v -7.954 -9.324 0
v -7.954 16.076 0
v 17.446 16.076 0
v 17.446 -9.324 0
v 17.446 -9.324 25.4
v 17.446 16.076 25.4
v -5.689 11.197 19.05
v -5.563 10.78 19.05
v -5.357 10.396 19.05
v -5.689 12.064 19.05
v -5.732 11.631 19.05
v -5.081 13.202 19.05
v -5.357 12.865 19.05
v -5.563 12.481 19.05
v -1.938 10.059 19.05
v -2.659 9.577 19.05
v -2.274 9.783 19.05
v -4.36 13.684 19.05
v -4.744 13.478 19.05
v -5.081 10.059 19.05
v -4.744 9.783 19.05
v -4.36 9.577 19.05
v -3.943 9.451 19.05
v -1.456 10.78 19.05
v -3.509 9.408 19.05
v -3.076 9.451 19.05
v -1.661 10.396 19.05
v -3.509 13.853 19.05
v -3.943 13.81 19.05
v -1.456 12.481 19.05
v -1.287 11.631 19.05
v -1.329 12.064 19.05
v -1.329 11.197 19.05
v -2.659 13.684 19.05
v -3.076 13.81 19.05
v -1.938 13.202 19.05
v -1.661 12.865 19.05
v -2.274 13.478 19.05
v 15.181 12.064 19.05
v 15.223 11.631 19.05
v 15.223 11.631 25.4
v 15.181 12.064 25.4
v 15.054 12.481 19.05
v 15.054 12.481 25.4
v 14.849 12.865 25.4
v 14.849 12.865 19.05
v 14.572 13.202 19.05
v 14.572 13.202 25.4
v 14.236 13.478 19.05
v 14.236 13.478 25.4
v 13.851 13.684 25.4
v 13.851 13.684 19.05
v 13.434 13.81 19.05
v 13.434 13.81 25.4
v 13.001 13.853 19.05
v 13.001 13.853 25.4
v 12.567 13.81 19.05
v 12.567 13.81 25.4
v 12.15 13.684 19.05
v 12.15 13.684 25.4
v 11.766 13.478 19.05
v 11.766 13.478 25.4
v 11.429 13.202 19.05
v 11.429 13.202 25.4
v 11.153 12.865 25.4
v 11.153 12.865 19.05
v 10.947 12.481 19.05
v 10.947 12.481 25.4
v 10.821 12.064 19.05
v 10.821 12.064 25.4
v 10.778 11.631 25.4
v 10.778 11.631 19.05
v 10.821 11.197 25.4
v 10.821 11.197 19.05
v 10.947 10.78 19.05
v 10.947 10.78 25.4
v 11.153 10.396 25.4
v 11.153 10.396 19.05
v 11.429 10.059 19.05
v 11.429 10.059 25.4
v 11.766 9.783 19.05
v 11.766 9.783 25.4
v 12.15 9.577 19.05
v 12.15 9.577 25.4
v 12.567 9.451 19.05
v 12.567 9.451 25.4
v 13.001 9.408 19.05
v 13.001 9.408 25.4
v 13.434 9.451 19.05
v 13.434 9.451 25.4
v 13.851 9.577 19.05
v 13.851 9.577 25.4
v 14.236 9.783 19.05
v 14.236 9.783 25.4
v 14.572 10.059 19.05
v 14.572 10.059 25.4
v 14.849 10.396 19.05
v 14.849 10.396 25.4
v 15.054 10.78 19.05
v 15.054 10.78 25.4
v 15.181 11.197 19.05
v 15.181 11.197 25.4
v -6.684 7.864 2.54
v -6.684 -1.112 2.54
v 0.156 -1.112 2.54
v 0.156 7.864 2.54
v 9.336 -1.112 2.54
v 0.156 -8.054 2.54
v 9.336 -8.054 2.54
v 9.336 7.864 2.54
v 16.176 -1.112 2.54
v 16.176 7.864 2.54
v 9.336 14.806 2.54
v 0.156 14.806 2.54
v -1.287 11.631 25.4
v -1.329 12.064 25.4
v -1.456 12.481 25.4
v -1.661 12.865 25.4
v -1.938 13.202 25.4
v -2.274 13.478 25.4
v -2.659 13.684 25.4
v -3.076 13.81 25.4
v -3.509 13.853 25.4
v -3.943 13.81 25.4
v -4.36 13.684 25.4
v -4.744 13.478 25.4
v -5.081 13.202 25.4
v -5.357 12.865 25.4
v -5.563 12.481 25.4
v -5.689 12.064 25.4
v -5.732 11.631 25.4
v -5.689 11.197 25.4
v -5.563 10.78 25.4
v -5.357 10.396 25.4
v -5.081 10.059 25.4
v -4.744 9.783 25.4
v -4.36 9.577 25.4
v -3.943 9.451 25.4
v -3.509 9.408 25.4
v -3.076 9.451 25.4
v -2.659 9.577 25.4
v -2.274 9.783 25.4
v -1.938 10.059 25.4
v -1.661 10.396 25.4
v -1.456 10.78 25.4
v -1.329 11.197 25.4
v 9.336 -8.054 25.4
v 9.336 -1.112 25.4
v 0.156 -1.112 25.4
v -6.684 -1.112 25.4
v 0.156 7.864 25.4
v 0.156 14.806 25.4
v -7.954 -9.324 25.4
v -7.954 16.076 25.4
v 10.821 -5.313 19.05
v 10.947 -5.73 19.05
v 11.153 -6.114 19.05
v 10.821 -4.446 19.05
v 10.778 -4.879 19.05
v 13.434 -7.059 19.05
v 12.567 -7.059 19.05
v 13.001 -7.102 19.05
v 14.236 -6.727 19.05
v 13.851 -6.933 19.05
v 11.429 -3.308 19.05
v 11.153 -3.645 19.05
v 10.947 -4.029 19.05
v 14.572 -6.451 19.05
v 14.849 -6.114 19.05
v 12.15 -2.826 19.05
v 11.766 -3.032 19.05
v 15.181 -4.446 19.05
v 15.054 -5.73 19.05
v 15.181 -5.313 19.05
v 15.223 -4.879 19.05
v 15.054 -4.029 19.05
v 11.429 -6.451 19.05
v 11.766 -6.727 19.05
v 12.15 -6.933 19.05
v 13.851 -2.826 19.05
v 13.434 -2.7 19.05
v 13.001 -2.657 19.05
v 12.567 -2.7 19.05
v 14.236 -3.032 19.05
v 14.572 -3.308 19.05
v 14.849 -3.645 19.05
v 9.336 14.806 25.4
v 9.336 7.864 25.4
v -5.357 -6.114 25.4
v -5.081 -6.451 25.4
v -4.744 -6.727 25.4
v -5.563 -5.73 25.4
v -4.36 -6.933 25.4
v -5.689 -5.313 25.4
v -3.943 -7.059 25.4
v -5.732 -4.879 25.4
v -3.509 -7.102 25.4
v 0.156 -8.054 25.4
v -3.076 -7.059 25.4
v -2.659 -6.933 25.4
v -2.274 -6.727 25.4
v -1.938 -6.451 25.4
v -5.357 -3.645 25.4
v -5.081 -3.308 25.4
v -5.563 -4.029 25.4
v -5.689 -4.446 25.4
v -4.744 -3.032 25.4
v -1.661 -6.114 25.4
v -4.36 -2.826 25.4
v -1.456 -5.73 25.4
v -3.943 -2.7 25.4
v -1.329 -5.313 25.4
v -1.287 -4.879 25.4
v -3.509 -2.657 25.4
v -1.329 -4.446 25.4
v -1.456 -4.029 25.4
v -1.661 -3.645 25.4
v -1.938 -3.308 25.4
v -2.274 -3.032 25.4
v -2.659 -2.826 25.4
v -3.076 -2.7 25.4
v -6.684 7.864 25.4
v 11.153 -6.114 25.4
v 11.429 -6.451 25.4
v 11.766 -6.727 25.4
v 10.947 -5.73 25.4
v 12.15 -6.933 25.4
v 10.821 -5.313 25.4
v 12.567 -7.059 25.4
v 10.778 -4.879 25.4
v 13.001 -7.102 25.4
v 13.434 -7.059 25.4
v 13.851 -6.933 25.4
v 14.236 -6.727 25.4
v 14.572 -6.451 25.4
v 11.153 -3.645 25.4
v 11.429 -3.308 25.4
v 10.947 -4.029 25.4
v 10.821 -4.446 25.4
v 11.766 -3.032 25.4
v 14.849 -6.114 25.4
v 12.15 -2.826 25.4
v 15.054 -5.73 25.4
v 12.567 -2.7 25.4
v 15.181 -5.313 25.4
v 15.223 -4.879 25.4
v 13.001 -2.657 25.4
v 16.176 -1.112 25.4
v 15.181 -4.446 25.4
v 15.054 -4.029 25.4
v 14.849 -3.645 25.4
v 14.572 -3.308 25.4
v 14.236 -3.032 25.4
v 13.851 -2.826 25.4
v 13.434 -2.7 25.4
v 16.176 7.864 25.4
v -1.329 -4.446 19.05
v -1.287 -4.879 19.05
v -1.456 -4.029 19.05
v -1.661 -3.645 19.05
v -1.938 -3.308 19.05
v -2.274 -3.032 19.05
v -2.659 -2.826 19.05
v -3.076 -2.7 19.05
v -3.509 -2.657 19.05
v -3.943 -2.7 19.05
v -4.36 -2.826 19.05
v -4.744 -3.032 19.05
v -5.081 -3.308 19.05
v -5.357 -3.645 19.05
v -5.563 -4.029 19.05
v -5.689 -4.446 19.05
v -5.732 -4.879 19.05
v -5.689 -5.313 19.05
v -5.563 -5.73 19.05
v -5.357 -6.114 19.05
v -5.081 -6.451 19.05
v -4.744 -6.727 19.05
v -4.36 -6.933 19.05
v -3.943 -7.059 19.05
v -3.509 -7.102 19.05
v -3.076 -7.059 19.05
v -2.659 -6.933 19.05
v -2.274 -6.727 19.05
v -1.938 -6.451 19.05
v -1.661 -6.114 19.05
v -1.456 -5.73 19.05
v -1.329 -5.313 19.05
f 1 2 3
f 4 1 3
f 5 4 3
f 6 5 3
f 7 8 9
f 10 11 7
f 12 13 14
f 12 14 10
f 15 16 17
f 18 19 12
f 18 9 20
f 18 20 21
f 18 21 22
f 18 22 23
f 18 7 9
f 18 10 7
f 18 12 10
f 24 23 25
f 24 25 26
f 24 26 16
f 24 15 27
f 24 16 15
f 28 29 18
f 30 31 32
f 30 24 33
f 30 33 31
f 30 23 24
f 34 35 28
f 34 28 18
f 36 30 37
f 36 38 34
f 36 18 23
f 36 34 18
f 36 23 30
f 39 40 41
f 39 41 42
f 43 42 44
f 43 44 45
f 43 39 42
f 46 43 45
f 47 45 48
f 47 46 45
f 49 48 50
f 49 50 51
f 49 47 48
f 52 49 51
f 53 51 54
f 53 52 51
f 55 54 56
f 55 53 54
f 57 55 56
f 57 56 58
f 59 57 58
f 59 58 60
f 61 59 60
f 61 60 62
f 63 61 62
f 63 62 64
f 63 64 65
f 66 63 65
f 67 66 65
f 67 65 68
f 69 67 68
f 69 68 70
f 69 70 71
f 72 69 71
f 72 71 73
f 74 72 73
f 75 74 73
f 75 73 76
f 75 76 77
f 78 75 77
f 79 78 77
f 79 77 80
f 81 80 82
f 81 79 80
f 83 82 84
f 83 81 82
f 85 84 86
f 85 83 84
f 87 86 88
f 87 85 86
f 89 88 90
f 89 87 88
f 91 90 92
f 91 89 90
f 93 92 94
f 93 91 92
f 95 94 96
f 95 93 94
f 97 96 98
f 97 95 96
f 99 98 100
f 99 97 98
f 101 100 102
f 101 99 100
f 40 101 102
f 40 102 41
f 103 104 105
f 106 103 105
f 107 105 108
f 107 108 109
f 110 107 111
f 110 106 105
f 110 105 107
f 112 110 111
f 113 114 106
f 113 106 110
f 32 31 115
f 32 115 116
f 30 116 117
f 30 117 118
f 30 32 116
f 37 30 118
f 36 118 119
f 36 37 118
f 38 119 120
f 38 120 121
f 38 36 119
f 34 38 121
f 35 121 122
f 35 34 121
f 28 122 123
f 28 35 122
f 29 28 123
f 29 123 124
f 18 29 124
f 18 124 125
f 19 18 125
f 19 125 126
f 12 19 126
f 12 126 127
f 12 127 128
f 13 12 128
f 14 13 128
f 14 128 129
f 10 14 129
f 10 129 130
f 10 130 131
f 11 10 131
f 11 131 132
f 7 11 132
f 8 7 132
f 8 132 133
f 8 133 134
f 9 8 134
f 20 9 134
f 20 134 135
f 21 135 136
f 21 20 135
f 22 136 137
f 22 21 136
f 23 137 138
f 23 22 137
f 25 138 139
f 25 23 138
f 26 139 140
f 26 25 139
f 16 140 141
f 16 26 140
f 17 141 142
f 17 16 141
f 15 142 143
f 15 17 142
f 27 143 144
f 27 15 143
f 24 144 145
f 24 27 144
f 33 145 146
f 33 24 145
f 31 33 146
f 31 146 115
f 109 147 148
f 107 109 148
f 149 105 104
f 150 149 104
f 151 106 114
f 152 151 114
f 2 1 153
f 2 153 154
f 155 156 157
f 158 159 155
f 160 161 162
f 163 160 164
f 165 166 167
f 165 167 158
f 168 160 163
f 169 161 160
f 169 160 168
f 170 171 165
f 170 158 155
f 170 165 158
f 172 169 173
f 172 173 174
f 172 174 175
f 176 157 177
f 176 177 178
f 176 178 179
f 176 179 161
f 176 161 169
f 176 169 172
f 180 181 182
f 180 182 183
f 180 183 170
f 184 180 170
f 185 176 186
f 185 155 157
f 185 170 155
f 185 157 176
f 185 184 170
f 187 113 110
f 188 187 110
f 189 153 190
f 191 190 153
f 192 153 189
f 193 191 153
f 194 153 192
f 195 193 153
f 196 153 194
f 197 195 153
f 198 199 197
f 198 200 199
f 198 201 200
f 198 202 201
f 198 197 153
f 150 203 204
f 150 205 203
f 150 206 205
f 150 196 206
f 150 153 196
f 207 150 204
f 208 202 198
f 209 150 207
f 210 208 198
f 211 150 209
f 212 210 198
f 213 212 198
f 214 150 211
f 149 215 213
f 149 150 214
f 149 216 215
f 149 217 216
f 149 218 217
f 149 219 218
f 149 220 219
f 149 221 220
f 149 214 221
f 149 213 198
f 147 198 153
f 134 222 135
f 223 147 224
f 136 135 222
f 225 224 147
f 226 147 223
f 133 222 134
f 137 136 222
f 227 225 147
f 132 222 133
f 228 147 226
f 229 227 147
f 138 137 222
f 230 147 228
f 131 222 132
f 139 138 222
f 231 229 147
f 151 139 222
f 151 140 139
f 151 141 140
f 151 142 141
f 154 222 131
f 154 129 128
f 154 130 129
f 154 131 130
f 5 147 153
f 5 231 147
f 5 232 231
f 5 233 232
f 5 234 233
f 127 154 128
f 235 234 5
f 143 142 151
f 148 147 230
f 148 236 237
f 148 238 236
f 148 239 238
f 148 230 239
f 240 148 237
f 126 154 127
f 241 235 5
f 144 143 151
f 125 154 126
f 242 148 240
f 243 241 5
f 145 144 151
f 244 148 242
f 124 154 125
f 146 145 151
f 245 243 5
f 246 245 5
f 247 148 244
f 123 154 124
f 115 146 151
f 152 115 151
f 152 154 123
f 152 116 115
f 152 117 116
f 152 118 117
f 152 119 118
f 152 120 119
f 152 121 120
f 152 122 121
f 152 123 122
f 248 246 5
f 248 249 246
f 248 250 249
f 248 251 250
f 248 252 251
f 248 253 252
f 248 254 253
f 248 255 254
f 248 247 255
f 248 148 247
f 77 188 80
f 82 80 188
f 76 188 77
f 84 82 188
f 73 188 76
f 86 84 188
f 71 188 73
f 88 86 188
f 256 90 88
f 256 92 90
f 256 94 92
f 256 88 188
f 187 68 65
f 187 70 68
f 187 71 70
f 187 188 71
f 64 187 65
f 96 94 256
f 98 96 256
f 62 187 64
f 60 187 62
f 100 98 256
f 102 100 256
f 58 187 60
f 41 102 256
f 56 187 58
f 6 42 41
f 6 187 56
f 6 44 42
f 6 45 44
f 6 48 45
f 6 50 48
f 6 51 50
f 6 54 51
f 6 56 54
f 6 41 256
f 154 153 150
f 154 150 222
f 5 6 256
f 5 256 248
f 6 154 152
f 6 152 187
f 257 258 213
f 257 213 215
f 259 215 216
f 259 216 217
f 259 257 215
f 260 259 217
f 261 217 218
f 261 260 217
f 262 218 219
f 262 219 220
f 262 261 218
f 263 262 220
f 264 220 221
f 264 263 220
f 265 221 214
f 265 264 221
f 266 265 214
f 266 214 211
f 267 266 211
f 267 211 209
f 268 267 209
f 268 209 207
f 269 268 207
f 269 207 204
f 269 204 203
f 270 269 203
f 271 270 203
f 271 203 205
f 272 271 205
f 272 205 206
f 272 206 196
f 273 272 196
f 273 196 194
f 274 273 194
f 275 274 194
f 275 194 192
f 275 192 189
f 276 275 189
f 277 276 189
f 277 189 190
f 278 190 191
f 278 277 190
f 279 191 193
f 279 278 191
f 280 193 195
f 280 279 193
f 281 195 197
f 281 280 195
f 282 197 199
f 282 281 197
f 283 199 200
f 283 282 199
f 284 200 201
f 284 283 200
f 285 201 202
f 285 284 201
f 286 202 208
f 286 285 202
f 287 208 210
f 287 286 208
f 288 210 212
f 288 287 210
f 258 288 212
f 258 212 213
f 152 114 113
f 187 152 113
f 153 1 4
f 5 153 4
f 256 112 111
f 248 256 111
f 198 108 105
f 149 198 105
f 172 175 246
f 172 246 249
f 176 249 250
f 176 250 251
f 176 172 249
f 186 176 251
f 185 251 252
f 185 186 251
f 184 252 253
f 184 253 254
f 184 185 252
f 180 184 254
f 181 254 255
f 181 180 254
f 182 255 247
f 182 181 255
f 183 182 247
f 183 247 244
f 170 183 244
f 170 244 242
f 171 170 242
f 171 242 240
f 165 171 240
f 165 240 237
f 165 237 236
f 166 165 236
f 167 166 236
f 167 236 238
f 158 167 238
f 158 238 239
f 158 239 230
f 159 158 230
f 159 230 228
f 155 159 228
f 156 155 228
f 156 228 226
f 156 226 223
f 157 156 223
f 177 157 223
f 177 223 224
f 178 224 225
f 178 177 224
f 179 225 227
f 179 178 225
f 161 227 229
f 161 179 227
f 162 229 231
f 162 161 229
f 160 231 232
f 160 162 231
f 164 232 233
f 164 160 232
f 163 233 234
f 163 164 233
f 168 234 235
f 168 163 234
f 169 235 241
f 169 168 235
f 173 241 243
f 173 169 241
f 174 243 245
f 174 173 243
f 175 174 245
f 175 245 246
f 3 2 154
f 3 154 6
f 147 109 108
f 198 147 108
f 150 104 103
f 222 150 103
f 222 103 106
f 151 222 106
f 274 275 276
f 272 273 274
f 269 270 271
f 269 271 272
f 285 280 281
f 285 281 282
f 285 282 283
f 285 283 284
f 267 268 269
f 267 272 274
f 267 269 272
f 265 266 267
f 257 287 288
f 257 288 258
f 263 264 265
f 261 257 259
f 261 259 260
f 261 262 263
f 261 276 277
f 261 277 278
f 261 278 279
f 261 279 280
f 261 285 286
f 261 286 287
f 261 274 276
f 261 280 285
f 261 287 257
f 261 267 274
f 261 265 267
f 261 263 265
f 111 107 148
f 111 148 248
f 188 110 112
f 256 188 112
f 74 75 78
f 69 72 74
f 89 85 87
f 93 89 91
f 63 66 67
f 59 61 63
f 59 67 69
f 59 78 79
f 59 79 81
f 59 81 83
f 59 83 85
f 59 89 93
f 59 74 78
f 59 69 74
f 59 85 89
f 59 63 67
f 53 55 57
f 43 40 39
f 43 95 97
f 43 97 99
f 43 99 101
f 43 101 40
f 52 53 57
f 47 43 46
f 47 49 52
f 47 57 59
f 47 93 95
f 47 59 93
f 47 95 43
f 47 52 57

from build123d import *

# Parameters (mm, degrees)
F1_DEPTH = 2.54
F0_R     = 2.2225
F2_DEPTH = 19.05
F0_W     = 25.4
F0_H     = 25.4
F0_W_2   = 6.8400954445
F0_H_2   = 6.9419826217
F3_DEPTH = 25.4


with BuildPart() as f1:
    # F0 (on Top) → F1 (new body)
    with BuildSketch(Plane.XY):
        Polygon((16.1757896501, -1.1124916385), (16.1757896501, 7.8635431181), (9.3356942055, 7.8635431181), (9.3356942055, 14.8055257398), (0.1558850946, 14.8055257398), (0.1558850946, 7.8635431181), (-6.6842103499, 7.8635431181), (-6.6842103499, -1.1124916385), (0.1558850946, -1.1124916385), (0.1558850946, -8.0544742602), (9.3356942055, -8.0544742602), (9.3356942055, -1.1124916385), align=None)
    extrude(amount=F1_DEPTH)



with BuildPart() as f2:
    # F0 (on Top) → F2 (new body)
    with BuildSketch(Plane.XY):
        with Locations((-3.5092103499, 11.6305257398)):
            Circle(F0_R)
    extrude(amount=F2_DEPTH)


with BuildPart() as f2b:
    # F0 (on Top) → F2, piece 2 (new body)
    with BuildSketch(Plane.XY):
        with Locations((13.0007896501, 11.6305257398)):
            Circle(F0_R)
    extrude(amount=F2_DEPTH)


with BuildPart() as f2c:
    # F0 (on Top) → F2, piece 3 (new body)
    with BuildSketch(Plane.XY):
        with Locations((13.0007896501, -4.8794742602)):
            Circle(F0_R)
    extrude(amount=F2_DEPTH)


with BuildPart() as f2d:
    # F0 (on Top) → F2, piece 4 (new body)
    with BuildSketch(Plane.XY):
        with Locations((-3.5092103499, -4.8794742602)):
            Circle(F0_R)
    extrude(amount=F2_DEPTH)


with BuildPart() as f1_1:
    add(f1.part)

    add(f2.part)  # F3 merges F2

    add(f2b.part)  # F3 merges F2b

    add(f2c.part)  # F3 merges F2c

    add(f2d.part)  # F3 merges F2d
    # F0 (on Top) → F3 (join)
    with BuildSketch(Plane.XY):
        with Locations((4.7457896501, 3.3755257398)):
            Rectangle(F0_W, F0_H)
        Polygon((13.6357896501, 14.8055257398), (16.1757896501, 14.8055257398), (16.1757896501, 7.8635431181), (16.1757896501, -1.1124916385), (16.1757896501, -8.0544742602), (9.3356942055, -8.0544742602), (0.1558850946, -8.0544742602), (-4.1442103499, -8.0544742602), (-6.6842103499, -8.0544742602), (-6.6842103499, -1.1124916385), (-6.6842103499, 7.8635431181), (-6.6842103499, 14.8055257398), (-4.1442103499, 14.8055257398), (0.1558850946, 14.8055257398), (9.3356942055, 14.8055257398), align=None, mode=Mode.SUBTRACT)
        Polygon((0.1558850946, 7.8635431181), (0.1558850946, 14.8055257398), (-4.1442103499, 14.8055257398), (-6.6842103499, 14.8055257398), (-6.6842103499, 7.8635431181), align=None)
        with Locations((-3.5092103499, 11.6305257398)):
            Circle(F0_R, mode=Mode.SUBTRACT)
        Polygon((-4.1442103499, -8.0544742602), (0.1558850946, -8.0544742602), (0.1558850946, -1.1124916385), (-6.6842103499, -1.1124916385), (-6.6842103499, -8.0544742602), align=None)
        with Locations((-3.5092103499, -4.8794742602)):
            Circle(F0_R, mode=Mode.SUBTRACT)
        with Locations((12.7557419278, -4.5834829494)):
            Rectangle(F0_W_2, F0_H_2)
        with Locations((13.0007896501, -4.8794742602)):
            Circle(F0_R, mode=Mode.SUBTRACT)
        Polygon((16.1757896501, 7.8635431181), (16.1757896501, 14.8055257398), (13.6357896501, 14.8055257398), (9.3356942055, 14.8055257398), (9.3356942055, 7.8635431181), align=None)
        with Locations((13.0007896501, 11.6305257398)):
            Circle(F0_R, mode=Mode.SUBTRACT)
    extrude(amount=F3_DEPTH)


solid = f1_1.part
